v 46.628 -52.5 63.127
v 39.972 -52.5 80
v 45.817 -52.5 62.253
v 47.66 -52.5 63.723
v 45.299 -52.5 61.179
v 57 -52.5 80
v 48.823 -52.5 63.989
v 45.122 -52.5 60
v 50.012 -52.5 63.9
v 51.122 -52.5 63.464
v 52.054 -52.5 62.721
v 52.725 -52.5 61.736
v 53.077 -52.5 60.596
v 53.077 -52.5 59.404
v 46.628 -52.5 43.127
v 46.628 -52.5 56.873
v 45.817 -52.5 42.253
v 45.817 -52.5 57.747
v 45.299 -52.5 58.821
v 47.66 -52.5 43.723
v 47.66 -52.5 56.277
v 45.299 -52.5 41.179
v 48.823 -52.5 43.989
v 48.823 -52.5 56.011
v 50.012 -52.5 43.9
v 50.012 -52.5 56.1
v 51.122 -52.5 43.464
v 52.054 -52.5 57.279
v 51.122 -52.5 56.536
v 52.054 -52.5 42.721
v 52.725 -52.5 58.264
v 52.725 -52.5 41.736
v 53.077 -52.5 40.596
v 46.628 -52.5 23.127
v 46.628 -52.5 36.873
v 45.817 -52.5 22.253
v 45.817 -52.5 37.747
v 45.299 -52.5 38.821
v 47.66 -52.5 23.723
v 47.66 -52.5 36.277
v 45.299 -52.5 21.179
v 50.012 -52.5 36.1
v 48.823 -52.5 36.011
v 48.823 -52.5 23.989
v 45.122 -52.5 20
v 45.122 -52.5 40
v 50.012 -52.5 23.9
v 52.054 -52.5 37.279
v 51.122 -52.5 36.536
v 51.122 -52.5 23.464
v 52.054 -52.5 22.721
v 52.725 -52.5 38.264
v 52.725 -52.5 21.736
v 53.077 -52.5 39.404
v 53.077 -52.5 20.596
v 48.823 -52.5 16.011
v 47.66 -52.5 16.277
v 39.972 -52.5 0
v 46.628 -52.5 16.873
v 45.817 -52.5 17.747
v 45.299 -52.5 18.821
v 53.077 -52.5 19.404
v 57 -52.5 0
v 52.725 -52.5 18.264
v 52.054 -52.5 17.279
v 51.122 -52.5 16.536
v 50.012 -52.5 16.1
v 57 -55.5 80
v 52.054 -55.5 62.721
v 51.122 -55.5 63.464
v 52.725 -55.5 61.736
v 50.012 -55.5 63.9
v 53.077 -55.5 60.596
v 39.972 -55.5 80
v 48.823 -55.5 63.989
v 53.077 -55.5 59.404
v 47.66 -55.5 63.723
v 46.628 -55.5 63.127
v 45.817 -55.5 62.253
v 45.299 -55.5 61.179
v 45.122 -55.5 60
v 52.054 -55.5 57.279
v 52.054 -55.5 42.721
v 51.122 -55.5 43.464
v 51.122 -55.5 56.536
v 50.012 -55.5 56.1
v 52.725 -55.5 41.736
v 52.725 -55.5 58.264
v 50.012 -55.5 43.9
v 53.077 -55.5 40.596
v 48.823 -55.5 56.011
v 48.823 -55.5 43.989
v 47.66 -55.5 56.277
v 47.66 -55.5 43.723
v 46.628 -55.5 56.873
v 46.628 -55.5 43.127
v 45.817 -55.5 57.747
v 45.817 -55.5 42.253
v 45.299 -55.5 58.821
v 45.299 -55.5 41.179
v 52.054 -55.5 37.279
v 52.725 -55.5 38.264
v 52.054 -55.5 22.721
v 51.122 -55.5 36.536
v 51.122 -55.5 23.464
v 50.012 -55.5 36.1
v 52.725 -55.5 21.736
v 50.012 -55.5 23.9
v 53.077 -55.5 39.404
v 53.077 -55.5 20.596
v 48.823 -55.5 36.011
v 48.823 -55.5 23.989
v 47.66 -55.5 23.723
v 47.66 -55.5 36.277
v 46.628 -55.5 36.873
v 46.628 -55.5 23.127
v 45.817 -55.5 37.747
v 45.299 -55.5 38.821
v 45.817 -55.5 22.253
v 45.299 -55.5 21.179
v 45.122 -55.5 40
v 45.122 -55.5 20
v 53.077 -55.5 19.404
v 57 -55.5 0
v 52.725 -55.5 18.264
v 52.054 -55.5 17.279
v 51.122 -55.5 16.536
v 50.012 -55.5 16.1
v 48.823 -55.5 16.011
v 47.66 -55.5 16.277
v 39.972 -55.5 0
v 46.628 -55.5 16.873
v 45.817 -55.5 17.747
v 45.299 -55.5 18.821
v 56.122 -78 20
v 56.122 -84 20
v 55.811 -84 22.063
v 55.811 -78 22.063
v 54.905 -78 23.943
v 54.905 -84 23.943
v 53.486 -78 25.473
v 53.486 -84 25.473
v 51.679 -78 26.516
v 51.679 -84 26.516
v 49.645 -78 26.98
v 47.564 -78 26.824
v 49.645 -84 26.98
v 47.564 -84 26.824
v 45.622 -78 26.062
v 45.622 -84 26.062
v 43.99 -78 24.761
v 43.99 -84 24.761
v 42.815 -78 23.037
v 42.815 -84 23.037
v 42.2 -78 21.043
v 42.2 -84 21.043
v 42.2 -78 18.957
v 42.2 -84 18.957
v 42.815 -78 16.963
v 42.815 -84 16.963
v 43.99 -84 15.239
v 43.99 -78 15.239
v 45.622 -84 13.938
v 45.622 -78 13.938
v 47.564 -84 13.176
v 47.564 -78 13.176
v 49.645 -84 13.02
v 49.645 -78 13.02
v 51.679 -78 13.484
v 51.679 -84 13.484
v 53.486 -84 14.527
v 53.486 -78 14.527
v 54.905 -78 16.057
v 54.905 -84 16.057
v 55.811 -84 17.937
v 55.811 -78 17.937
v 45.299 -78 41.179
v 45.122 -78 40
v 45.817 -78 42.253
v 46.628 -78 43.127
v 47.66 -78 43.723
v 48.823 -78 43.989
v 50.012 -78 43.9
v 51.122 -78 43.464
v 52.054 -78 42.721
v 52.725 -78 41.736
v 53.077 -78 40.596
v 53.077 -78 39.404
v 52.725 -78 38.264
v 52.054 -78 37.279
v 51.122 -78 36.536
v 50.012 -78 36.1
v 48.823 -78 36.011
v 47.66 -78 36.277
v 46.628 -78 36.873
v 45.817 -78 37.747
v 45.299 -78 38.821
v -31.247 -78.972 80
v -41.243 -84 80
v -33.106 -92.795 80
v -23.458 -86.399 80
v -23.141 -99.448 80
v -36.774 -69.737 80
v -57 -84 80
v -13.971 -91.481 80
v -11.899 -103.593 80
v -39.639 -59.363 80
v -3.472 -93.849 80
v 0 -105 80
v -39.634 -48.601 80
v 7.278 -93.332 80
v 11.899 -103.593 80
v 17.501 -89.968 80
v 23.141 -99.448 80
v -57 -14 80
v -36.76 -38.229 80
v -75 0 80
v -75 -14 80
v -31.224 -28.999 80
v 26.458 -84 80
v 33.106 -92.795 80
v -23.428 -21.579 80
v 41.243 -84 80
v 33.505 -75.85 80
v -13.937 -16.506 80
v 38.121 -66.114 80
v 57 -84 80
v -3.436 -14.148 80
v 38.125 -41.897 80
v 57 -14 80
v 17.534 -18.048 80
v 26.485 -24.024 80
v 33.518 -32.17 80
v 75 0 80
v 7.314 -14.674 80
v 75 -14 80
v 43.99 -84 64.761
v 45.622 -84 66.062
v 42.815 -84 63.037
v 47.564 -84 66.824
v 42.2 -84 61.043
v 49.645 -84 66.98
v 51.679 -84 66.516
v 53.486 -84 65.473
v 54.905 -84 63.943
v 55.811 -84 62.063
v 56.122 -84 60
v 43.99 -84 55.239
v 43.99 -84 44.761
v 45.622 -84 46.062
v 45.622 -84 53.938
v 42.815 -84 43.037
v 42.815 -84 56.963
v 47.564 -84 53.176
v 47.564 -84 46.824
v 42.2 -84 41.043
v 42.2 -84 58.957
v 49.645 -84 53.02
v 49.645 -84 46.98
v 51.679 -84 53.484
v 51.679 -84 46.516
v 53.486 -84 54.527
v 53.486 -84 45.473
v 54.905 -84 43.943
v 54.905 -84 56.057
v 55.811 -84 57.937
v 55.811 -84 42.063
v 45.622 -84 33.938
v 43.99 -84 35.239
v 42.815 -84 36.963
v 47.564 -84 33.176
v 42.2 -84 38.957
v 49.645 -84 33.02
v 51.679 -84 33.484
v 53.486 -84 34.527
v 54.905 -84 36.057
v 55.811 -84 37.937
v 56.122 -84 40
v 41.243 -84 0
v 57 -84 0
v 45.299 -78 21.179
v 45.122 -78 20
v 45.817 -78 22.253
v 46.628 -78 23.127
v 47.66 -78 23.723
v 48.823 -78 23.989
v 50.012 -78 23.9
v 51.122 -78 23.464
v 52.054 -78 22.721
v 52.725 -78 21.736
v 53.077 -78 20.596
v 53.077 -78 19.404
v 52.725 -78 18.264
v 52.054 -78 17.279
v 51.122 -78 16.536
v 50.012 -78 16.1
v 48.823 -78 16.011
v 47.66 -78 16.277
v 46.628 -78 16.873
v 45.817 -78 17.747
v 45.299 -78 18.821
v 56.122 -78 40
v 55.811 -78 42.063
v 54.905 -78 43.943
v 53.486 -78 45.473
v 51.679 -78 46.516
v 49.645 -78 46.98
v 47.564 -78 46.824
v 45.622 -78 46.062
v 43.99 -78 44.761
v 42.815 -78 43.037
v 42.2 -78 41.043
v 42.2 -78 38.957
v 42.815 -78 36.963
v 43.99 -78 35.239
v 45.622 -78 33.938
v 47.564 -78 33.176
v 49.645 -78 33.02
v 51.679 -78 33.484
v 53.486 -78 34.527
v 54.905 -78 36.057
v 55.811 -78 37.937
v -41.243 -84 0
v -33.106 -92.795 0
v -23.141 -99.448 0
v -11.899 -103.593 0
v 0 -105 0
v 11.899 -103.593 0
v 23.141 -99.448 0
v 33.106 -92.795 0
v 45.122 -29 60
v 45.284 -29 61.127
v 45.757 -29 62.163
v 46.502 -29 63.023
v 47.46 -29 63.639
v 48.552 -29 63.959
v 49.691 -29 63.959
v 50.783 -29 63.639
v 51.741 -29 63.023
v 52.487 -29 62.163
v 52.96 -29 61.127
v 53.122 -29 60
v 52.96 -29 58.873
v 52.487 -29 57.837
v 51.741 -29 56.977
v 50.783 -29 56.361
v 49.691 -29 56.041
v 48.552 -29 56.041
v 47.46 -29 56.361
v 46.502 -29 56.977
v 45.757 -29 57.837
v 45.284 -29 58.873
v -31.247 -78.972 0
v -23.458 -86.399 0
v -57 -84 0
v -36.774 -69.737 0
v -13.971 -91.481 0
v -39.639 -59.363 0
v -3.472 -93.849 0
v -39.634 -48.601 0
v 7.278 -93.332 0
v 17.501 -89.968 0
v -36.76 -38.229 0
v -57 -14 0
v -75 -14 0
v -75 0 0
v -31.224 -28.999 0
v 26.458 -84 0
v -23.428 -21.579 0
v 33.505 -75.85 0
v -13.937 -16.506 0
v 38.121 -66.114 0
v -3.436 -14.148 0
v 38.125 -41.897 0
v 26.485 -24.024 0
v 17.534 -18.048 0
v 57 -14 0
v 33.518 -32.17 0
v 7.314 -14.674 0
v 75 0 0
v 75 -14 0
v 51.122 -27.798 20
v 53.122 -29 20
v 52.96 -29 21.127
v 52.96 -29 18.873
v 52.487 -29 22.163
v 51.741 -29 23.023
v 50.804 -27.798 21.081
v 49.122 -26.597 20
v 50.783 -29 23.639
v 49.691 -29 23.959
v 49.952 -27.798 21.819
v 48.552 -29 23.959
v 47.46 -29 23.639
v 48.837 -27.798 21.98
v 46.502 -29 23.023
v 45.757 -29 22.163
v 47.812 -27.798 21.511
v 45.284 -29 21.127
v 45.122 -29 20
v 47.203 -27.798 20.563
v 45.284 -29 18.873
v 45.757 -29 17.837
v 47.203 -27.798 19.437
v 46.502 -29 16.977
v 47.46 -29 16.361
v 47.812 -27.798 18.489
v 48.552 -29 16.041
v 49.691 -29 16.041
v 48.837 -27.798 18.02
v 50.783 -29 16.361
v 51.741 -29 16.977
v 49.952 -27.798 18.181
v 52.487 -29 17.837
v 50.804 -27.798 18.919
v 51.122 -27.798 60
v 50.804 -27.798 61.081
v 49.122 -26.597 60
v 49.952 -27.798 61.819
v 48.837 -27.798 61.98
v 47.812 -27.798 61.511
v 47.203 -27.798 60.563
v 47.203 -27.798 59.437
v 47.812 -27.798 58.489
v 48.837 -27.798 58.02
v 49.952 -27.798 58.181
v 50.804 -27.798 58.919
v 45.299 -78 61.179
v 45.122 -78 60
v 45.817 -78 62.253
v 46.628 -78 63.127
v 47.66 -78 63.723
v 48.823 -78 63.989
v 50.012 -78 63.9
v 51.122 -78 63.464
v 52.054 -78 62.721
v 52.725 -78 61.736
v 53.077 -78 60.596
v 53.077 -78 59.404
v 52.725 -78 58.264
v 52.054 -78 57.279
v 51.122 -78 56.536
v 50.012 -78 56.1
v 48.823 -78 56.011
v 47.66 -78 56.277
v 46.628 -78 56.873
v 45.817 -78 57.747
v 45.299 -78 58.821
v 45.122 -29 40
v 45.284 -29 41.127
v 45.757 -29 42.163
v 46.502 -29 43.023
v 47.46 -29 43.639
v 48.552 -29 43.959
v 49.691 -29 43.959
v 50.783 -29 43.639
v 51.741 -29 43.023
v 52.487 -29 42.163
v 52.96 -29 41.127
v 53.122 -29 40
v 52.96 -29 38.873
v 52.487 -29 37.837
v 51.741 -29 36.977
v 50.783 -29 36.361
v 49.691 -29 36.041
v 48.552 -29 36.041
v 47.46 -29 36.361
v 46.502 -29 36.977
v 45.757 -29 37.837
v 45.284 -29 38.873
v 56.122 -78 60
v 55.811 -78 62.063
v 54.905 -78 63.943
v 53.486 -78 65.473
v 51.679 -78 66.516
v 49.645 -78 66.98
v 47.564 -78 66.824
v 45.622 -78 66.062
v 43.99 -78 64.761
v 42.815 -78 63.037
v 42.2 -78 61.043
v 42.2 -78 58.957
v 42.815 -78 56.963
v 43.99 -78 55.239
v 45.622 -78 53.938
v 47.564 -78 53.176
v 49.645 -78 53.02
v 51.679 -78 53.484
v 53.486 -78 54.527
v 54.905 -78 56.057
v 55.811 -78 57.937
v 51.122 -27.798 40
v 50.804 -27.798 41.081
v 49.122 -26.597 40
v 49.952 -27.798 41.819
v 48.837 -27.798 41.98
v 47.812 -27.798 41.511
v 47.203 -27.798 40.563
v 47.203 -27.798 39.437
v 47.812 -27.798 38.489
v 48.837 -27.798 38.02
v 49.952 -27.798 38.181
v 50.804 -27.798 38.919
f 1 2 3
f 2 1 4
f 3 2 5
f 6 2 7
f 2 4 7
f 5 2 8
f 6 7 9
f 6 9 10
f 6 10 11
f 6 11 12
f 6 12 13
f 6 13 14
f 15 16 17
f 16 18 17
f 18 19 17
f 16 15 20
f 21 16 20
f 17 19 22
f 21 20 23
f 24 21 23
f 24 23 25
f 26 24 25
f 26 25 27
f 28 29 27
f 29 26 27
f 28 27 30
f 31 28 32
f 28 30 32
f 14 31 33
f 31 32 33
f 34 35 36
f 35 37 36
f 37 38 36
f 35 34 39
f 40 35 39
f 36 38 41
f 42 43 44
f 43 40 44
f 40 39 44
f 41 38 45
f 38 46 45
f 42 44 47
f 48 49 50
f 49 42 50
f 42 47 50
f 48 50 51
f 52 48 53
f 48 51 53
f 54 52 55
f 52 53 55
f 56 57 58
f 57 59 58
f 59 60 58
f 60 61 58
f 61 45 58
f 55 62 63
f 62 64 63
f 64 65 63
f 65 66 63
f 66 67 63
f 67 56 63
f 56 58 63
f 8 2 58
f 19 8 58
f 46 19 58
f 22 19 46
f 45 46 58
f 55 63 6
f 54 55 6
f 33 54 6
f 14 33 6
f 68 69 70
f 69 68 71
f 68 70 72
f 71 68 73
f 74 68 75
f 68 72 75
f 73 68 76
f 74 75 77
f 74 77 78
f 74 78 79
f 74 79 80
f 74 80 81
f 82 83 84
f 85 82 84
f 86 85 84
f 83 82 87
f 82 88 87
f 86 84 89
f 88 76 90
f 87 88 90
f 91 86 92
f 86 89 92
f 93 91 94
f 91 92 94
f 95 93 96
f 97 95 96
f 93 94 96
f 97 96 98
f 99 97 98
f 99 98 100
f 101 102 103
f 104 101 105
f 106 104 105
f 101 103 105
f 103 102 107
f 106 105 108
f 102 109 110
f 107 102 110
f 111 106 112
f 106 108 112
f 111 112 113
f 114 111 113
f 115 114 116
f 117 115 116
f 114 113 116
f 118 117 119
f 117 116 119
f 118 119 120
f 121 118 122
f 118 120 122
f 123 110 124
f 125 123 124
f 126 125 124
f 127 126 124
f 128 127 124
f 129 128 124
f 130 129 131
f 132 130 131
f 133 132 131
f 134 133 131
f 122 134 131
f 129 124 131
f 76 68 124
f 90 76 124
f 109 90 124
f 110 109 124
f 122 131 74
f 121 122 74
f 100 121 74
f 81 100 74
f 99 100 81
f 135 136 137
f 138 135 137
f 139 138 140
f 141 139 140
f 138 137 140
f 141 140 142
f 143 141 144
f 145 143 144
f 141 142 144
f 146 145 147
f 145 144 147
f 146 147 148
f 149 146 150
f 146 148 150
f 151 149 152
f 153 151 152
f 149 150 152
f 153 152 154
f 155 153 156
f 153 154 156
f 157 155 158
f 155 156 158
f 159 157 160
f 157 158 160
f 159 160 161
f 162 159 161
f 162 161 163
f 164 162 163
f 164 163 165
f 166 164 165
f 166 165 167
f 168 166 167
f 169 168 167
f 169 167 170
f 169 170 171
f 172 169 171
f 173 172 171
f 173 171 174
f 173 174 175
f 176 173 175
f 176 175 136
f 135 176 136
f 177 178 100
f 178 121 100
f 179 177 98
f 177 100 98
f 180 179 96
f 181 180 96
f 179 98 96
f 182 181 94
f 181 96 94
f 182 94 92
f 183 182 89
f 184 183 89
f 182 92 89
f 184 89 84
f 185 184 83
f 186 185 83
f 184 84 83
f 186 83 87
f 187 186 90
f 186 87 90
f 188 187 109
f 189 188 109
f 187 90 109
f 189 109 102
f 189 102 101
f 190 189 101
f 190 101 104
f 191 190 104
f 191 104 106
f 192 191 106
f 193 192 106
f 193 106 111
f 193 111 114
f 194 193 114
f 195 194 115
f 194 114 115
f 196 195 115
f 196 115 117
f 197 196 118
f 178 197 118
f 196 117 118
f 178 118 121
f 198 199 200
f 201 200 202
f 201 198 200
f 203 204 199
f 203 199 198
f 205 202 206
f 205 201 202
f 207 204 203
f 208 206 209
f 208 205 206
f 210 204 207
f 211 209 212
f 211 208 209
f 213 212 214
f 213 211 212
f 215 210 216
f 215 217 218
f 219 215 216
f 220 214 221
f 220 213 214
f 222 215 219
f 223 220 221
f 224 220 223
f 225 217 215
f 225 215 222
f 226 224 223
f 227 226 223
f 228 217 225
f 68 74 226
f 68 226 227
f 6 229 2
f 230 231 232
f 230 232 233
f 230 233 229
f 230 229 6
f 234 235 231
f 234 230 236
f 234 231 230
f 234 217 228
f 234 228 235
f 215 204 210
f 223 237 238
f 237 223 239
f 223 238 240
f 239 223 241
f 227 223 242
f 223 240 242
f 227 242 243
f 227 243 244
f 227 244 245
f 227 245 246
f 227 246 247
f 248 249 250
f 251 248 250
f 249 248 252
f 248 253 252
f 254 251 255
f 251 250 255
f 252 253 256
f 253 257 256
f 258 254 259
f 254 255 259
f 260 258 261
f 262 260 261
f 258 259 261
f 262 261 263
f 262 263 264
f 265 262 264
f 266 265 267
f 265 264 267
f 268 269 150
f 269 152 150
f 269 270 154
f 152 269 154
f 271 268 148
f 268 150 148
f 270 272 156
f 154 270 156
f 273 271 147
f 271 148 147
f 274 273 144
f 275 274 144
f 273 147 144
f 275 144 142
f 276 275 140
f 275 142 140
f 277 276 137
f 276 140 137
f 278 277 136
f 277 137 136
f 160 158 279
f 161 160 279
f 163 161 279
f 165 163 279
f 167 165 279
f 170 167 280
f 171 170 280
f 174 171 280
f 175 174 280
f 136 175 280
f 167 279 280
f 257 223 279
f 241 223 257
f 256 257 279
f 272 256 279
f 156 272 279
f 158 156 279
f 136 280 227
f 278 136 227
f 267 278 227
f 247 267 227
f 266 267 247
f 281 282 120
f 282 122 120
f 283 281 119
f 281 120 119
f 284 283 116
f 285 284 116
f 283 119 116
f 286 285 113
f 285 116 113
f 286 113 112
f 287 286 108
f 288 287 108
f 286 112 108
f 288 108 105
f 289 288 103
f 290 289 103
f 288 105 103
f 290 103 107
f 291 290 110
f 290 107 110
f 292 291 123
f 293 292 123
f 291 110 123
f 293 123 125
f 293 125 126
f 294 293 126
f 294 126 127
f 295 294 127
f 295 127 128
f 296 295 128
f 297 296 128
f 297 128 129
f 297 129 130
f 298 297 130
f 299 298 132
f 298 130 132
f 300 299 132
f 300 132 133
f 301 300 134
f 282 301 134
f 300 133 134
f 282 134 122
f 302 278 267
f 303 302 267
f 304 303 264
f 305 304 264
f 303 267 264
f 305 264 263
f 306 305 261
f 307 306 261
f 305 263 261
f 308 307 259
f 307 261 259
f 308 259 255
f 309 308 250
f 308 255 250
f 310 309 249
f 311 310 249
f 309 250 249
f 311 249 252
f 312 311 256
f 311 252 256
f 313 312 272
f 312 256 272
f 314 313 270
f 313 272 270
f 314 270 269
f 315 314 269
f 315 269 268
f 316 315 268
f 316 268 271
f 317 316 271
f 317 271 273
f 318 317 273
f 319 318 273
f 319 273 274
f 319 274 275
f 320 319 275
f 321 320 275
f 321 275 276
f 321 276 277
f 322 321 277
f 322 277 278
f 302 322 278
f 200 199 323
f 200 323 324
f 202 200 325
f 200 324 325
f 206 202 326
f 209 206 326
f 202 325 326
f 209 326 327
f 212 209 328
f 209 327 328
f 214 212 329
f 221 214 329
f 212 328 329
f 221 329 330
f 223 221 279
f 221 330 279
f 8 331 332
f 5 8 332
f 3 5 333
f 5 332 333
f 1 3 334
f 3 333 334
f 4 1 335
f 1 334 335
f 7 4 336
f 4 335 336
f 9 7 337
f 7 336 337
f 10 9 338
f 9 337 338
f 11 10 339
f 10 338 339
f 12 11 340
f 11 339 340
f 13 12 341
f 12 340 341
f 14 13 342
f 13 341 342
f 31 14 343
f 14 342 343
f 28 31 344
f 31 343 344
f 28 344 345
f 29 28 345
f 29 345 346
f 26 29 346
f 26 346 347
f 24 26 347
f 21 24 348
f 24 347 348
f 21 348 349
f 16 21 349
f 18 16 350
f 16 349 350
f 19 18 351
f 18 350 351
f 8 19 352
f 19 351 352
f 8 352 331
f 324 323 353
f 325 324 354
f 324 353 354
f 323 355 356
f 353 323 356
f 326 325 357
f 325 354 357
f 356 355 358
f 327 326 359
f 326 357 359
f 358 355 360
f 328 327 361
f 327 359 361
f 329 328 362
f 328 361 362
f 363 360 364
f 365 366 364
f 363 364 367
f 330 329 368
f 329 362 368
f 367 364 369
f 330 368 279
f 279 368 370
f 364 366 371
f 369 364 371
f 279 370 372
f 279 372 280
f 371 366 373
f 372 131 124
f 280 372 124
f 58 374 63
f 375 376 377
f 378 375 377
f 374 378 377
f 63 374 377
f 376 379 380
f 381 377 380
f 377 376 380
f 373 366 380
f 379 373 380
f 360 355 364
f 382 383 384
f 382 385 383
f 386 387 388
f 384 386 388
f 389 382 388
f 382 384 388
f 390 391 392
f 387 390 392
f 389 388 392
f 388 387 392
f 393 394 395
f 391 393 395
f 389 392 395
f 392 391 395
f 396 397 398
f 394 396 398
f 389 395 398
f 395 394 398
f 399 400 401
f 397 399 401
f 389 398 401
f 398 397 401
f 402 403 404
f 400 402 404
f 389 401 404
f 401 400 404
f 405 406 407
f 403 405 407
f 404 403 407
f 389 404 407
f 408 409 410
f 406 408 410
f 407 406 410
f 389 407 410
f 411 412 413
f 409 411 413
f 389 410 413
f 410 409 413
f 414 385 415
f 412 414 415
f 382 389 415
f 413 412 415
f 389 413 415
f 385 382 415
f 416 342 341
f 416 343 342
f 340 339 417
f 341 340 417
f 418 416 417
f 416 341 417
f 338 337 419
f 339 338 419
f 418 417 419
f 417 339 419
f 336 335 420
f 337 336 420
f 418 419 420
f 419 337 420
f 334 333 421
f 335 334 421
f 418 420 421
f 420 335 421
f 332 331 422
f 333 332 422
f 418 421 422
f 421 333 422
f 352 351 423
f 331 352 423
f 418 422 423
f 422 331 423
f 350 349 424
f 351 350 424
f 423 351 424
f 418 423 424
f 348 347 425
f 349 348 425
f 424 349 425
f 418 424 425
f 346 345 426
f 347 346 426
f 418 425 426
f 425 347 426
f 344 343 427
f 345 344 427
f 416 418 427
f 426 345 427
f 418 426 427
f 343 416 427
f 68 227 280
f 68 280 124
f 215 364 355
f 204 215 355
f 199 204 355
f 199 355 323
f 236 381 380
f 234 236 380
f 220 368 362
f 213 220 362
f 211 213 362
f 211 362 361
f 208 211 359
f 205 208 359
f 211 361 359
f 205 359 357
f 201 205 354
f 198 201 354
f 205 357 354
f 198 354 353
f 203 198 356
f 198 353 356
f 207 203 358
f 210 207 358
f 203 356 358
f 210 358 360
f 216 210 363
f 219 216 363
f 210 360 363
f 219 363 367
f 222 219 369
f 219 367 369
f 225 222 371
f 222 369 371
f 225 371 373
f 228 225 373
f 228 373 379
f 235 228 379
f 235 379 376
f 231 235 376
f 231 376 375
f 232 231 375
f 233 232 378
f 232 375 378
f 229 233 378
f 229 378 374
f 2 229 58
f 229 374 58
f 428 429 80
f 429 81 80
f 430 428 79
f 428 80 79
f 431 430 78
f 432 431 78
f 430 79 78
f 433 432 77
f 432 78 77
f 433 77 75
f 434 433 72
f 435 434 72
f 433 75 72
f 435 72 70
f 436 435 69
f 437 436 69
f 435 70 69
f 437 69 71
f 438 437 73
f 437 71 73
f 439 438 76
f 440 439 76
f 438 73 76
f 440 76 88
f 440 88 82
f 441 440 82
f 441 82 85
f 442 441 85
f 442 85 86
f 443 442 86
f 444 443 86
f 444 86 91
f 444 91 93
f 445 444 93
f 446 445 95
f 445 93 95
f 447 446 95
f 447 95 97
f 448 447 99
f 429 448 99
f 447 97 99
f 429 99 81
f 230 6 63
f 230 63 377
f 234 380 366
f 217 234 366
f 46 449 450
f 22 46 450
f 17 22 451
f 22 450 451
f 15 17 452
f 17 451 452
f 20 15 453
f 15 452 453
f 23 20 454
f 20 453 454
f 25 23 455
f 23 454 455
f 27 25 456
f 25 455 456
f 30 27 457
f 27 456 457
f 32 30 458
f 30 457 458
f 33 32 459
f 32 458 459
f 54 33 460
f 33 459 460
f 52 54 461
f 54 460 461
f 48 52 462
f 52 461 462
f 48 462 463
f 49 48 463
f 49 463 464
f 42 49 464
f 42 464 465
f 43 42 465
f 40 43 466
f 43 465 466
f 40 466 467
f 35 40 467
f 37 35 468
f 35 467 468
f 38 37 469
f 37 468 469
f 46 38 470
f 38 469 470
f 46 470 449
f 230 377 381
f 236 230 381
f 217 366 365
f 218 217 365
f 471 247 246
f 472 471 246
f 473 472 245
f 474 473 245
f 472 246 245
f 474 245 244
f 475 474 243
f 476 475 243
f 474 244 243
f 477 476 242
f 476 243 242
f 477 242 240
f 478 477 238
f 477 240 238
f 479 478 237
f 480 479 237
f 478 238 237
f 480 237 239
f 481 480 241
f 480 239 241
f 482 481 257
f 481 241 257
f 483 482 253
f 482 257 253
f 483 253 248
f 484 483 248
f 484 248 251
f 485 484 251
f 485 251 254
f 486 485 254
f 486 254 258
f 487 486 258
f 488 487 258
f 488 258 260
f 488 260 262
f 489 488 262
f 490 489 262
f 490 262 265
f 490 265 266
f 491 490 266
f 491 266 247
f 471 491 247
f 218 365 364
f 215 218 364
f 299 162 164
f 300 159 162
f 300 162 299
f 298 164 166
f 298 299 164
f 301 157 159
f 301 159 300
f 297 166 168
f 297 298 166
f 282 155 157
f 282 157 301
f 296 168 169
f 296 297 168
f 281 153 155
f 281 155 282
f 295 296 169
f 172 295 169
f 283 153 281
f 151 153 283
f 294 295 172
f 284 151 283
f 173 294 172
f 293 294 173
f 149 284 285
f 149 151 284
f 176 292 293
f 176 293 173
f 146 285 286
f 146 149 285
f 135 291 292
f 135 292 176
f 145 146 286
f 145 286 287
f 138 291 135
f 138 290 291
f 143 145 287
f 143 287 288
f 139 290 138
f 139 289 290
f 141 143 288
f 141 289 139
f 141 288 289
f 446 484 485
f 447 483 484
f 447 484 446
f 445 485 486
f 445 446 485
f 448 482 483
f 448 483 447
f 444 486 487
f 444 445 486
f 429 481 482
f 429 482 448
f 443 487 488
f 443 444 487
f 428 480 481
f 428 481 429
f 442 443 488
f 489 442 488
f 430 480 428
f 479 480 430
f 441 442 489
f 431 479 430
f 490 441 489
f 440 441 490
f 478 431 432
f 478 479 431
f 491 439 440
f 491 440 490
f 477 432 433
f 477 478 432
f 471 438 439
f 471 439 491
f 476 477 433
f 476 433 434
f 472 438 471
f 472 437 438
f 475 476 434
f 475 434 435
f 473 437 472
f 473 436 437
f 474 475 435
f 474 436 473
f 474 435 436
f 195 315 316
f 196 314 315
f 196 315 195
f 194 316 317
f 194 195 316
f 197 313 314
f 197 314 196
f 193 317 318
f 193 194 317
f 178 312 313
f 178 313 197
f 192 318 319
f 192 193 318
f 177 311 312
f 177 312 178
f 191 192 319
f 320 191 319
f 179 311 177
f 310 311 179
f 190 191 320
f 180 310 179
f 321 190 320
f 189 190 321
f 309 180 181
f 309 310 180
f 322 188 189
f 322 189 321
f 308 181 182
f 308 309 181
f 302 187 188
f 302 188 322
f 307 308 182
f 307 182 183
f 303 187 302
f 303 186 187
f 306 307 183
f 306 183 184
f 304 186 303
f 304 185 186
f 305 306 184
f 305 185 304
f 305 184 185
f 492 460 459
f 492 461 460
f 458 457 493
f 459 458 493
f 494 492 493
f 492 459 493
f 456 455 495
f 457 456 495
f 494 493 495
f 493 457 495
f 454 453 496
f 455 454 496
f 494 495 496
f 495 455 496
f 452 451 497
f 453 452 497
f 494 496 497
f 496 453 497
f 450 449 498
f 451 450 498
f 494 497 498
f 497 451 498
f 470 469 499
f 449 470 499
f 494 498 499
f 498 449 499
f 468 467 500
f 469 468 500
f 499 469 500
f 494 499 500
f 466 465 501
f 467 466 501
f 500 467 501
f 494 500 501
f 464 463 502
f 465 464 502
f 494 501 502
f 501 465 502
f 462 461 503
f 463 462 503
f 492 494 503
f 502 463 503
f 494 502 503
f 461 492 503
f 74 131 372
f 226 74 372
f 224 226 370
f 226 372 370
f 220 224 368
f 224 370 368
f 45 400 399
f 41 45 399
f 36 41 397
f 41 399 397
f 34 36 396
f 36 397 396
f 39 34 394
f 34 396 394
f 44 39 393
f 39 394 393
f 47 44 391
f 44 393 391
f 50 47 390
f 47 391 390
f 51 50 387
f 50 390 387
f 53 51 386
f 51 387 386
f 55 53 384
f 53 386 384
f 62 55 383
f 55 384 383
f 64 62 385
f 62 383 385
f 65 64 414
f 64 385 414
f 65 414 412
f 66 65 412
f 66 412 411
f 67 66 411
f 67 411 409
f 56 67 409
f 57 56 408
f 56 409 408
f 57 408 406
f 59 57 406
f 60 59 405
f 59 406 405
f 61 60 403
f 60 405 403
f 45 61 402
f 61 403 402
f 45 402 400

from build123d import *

# Parameters (mm, degrees)
F1_DEPTH       = 80
F3_D           = 8
F3_DEPTH       = 55
F3_CBORE_D     = 14
F3_CBORE_DEPTH = 6
F3_TIP         = 2.4034424761


# Not quite as in the source:
# - a feature of the source that left no trace in its solid (it failed there, or was rolled back) is left out


with BuildPart() as f1:
    # F0 (on Top) → F1 (new body)
    with BuildSketch(Plane.XY):
        with BuildLine():
            ThreePointArc((-31.6385840391, -14), (0, -3), (31.6385840391, -14))
            Line((31.6385840391, -14), (57, -14))
            Line((57, -14), (75, -14))
            Line((75, -14), (75, 0))
            Line((75, 0), (-75, 0))
            Line((-75, 0), (-75, -14))
            Line((-75, -14), (-57, -14))
            Line((-57, -14), (-31.6385840391, -14))
        make_face()
        with BuildLine():
            ThreePointArc((-41.2431812546, -84), (-50.5266061405, -47.0673185622), (-31.6385840391, -14))
            Line((-31.6385840391, -14), (-57, -14))
            Line((-57, -14), (-57, -84))
            Line((-57, -84), (-41.2431812546, -84))
        make_face()
        with BuildLine():
            ThreePointArc((0, -14), (27.748873851, -25.1902794182), (39.9718651053, -52.5))
            Line((39.9718651053, -52.5), (50.9779364039, -52.5))
            ThreePointArc((50.9779364039, -52.5), (45.5734008225, -31.1075309878), (31.6385840391, -14))
            Line((31.6385840391, -14), (0, -14))
        make_face()
        with BuildLine():
            ThreePointArc((-26.4575131106, -84), (-37.4165738677, -39.8578643763), (0, -14))
            Line((0, -14), (-31.6385840391, -14))
            ThreePointArc((-31.6385840391, -14), (-50.5266061405, -47.0673185622), (-41.2431812546, -84))
            Line((-41.2431812546, -84), (-26.4575131106, -84))
        make_face()
        with BuildLine():
            Line((57, -55.5), (50.9779364039, -55.5))
            ThreePointArc((50.9779364039, -55.5), (48.2622640947, -70.4849587338), (41.2431812546, -84))
            Line((41.2431812546, -84), (57, -84))
            Line((57, -84), (57, -55.5))
        make_face()
        with BuildLine():
            ThreePointArc((31.6385840391, -14), (45.5734008225, -31.1075309878), (50.9779364039, -52.5))
            Line((50.9779364039, -52.5), (57, -52.5))
            Line((57, -52.5), (57, -14))
            Line((57, -14), (31.6385840391, -14))
        make_face()
        with BuildLine():
            Line((41.2431812546, -84), (26.4575131106, -84))
            ThreePointArc((26.4575131106, -84), (0, -94), (-26.4575131106, -84))
            Line((-26.4575131106, -84), (-41.2431812546, -84))
            ThreePointArc((-41.2431812546, -84), (0, -105), (41.2431812546, -84))
        make_face()
        with BuildLine():
            Line((50.9779364039, -55.5), (39.9718651053, -55.5))
            ThreePointArc((39.9718651053, -55.5), (36.1424690986, -71.1383175213), (26.4575131106, -84))
            Line((26.4575131106, -84), (41.2431812546, -84))
            ThreePointArc((41.2431812546, -84), (48.2622640947, -70.4849587338), (50.9779364039, -55.5))
        make_face()
        with BuildLine():
            Line((-31.6385840391, -14), (0, -14))
            Line((0, -14), (31.6385840391, -14))
            ThreePointArc((31.6385840391, -14), (0, -3), (-31.6385840391, -14))
        make_face()
    extrude(amount=F1_DEPTH)

    # F3
    with Locations(Plane.XZ.offset(84)):
        with Locations((49.1215906273, 20), (49.1215906273, 40), (49.1215906273, 60)):
            CounterBoreHole(F3_D / 2, F3_CBORE_D / 2, F3_CBORE_DEPTH, depth=F3_DEPTH)
            with Locations((0, 0, -(F3_DEPTH + F3_TIP / 2))):  # 118° drill point
                Cone(0, F3_D / 2, F3_TIP, mode=Mode.SUBTRACT)


solid = f1.part
